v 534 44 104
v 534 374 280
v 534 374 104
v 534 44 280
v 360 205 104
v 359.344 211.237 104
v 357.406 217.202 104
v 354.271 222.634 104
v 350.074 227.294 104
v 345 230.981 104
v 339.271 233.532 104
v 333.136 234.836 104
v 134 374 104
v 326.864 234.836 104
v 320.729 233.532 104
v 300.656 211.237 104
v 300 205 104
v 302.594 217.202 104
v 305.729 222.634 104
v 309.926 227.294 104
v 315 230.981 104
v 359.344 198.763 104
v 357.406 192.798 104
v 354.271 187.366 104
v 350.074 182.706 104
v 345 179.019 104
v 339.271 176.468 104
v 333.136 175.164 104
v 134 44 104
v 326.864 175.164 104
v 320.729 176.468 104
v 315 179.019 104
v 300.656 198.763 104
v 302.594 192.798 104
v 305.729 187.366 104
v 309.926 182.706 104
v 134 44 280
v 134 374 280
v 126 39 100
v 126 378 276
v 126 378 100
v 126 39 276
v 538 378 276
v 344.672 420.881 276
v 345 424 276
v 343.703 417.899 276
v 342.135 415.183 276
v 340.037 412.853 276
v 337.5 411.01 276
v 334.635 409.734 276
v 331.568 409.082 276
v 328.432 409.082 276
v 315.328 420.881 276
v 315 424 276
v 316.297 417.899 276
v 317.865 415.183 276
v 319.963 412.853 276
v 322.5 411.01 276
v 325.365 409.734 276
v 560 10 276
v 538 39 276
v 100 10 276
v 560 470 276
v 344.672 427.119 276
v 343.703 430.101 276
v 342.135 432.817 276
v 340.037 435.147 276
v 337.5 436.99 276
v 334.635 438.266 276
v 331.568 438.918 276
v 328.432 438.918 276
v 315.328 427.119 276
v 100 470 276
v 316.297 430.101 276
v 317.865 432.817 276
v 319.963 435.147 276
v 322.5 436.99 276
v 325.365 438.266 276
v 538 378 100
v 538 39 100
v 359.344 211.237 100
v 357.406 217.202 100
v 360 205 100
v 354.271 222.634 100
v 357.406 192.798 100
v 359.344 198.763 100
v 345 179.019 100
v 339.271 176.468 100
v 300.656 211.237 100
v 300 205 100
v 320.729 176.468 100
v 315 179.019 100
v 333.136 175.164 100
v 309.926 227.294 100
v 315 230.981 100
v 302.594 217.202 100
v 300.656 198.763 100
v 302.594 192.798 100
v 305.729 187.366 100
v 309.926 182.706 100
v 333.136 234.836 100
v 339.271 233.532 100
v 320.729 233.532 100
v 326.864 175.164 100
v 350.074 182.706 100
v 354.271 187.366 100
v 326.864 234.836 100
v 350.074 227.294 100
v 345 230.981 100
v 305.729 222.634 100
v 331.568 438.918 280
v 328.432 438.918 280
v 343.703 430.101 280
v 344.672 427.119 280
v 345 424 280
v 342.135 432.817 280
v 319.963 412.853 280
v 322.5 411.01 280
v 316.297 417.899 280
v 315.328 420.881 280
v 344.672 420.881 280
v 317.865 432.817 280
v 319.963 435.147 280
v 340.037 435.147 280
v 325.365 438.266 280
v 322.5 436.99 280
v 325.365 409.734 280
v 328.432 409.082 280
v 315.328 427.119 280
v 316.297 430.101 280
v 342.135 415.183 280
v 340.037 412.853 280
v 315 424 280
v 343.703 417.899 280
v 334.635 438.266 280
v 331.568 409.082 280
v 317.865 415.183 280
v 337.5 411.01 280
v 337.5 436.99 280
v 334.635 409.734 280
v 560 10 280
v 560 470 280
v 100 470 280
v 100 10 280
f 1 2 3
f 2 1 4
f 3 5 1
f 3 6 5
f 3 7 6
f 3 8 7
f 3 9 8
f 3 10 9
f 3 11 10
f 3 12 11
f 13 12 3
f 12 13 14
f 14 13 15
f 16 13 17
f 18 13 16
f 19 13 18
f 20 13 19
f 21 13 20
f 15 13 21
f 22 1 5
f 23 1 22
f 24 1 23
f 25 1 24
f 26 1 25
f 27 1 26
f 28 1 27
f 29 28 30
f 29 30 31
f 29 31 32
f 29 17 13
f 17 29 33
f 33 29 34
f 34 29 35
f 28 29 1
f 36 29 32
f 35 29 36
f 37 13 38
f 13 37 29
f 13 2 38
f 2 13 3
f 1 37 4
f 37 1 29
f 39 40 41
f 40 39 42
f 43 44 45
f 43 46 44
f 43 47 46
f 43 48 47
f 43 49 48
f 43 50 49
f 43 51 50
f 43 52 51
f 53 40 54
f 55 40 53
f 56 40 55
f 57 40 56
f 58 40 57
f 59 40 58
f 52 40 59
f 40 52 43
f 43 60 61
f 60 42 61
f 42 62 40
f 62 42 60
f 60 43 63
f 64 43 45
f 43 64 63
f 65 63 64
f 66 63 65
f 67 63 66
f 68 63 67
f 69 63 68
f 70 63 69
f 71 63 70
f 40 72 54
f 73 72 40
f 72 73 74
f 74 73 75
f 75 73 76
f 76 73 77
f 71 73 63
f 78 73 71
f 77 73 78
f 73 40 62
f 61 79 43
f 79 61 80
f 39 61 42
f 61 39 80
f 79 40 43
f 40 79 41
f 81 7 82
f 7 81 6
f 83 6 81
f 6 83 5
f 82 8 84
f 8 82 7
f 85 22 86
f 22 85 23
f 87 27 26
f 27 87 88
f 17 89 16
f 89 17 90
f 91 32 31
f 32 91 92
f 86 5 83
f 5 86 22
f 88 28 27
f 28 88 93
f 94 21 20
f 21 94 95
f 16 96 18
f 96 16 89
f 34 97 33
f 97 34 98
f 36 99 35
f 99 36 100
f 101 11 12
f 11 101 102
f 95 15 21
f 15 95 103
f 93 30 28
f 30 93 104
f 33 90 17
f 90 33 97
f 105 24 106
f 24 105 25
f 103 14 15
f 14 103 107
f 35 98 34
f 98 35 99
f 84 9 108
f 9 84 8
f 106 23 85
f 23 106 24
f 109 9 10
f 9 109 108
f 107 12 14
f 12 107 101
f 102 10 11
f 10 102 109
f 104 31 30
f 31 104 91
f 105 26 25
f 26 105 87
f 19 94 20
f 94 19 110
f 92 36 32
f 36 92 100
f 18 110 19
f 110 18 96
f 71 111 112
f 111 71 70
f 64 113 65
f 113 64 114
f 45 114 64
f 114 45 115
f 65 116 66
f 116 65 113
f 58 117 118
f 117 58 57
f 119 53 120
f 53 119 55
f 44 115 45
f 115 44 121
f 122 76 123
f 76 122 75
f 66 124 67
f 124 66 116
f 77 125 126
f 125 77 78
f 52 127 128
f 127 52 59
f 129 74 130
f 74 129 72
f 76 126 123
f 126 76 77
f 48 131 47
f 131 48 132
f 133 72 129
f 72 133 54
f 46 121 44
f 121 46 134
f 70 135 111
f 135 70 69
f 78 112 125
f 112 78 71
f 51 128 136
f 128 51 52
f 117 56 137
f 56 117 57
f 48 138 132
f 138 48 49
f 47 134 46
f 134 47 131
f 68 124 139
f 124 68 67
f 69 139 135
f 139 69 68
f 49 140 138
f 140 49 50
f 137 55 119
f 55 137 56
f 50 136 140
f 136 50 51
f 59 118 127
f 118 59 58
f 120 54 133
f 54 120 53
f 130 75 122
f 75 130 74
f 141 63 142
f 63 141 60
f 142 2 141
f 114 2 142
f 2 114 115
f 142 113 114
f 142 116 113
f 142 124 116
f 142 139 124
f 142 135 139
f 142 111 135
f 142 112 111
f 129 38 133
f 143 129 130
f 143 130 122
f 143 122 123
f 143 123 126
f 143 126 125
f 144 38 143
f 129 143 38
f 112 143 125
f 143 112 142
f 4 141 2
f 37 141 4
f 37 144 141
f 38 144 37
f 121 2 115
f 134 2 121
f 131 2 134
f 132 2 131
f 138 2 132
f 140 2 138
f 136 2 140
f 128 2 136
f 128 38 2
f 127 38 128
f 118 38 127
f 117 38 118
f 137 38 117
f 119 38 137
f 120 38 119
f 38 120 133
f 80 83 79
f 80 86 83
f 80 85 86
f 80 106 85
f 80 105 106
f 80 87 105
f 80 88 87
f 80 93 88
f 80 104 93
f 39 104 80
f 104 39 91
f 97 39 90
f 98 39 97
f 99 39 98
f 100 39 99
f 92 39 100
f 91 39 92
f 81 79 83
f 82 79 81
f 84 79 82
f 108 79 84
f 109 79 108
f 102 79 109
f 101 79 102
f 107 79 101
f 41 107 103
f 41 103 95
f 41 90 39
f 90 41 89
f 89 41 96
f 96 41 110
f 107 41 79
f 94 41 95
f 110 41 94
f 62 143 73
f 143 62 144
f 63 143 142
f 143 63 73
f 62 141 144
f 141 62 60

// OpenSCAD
/*

    Sink
    
    By Anton Augustsson


*/

module sink (
    xDrawer,yDrawer,zDrawer,
    ){
/*
    ---------- Local varibles ---------- 
*/

thickness = 4;
edge = 30;

length = 460;
width  = 460;
height = 180;

innerLength = 330;
innerWidth = 400;
        
x=xDrawer;
y=yDrawer;
z=zDrawer;

/*
    ---------- Code ---------- 
*/

translate([
    x,
    y,
    z]) 
difference () {
union () {
translate([
    0,
    0,
    0]) 
cube(size = [
    width,
    length,
    height]);

}

union () {

// Remove Sink
translate([
    edge+thickness,
    edge+thickness,
    thickness]) 
cube(size = [
    innerWidth,
    innerLength,
    height]);
    
// Remove left edge
translate([
    -thickness,
    -1,
    -thickness]) 
cube(size = [
    edge,
    length+2,
    height]);

// Remove right edge
translate([
    width+thickness*2-edge,
    -1,
    -thickness]) 
cube(size = [
    edge,
    length+2,
    height]);
    
// Remove front edge
translate([
    -1,
    -1,
    -thickness]) 
cube(size = [
    width+2,
    edge,
    height]);
    
// Remove front edge
translate([
    -1,
    innerLength+edge+thickness*2,
    -thickness]) 
cube(size = [
    width+2,
    edge+100,
    height]);

// Dranige    
translate([
    width/2,                   
    innerLength/2+edge,   
    -1
    ])  
cylinder(
    h = thickness+2,    
    r = 30
    );
    
// Hold 
translate([
    width/2,                   
    (innerLength+edge+thickness*2
    +length)/2,   
    height-thickness-1   
    ])  
cylinder(
    h = thickness+2,    
    r = 15        
    );      

}}}
    
/*
    ---------- Example ---------- 
*/


xDrawer=100;
yDrawer=10;
zDrawer=100;

sink (
    xDrawer,yDrawer,zDrawer
    );
